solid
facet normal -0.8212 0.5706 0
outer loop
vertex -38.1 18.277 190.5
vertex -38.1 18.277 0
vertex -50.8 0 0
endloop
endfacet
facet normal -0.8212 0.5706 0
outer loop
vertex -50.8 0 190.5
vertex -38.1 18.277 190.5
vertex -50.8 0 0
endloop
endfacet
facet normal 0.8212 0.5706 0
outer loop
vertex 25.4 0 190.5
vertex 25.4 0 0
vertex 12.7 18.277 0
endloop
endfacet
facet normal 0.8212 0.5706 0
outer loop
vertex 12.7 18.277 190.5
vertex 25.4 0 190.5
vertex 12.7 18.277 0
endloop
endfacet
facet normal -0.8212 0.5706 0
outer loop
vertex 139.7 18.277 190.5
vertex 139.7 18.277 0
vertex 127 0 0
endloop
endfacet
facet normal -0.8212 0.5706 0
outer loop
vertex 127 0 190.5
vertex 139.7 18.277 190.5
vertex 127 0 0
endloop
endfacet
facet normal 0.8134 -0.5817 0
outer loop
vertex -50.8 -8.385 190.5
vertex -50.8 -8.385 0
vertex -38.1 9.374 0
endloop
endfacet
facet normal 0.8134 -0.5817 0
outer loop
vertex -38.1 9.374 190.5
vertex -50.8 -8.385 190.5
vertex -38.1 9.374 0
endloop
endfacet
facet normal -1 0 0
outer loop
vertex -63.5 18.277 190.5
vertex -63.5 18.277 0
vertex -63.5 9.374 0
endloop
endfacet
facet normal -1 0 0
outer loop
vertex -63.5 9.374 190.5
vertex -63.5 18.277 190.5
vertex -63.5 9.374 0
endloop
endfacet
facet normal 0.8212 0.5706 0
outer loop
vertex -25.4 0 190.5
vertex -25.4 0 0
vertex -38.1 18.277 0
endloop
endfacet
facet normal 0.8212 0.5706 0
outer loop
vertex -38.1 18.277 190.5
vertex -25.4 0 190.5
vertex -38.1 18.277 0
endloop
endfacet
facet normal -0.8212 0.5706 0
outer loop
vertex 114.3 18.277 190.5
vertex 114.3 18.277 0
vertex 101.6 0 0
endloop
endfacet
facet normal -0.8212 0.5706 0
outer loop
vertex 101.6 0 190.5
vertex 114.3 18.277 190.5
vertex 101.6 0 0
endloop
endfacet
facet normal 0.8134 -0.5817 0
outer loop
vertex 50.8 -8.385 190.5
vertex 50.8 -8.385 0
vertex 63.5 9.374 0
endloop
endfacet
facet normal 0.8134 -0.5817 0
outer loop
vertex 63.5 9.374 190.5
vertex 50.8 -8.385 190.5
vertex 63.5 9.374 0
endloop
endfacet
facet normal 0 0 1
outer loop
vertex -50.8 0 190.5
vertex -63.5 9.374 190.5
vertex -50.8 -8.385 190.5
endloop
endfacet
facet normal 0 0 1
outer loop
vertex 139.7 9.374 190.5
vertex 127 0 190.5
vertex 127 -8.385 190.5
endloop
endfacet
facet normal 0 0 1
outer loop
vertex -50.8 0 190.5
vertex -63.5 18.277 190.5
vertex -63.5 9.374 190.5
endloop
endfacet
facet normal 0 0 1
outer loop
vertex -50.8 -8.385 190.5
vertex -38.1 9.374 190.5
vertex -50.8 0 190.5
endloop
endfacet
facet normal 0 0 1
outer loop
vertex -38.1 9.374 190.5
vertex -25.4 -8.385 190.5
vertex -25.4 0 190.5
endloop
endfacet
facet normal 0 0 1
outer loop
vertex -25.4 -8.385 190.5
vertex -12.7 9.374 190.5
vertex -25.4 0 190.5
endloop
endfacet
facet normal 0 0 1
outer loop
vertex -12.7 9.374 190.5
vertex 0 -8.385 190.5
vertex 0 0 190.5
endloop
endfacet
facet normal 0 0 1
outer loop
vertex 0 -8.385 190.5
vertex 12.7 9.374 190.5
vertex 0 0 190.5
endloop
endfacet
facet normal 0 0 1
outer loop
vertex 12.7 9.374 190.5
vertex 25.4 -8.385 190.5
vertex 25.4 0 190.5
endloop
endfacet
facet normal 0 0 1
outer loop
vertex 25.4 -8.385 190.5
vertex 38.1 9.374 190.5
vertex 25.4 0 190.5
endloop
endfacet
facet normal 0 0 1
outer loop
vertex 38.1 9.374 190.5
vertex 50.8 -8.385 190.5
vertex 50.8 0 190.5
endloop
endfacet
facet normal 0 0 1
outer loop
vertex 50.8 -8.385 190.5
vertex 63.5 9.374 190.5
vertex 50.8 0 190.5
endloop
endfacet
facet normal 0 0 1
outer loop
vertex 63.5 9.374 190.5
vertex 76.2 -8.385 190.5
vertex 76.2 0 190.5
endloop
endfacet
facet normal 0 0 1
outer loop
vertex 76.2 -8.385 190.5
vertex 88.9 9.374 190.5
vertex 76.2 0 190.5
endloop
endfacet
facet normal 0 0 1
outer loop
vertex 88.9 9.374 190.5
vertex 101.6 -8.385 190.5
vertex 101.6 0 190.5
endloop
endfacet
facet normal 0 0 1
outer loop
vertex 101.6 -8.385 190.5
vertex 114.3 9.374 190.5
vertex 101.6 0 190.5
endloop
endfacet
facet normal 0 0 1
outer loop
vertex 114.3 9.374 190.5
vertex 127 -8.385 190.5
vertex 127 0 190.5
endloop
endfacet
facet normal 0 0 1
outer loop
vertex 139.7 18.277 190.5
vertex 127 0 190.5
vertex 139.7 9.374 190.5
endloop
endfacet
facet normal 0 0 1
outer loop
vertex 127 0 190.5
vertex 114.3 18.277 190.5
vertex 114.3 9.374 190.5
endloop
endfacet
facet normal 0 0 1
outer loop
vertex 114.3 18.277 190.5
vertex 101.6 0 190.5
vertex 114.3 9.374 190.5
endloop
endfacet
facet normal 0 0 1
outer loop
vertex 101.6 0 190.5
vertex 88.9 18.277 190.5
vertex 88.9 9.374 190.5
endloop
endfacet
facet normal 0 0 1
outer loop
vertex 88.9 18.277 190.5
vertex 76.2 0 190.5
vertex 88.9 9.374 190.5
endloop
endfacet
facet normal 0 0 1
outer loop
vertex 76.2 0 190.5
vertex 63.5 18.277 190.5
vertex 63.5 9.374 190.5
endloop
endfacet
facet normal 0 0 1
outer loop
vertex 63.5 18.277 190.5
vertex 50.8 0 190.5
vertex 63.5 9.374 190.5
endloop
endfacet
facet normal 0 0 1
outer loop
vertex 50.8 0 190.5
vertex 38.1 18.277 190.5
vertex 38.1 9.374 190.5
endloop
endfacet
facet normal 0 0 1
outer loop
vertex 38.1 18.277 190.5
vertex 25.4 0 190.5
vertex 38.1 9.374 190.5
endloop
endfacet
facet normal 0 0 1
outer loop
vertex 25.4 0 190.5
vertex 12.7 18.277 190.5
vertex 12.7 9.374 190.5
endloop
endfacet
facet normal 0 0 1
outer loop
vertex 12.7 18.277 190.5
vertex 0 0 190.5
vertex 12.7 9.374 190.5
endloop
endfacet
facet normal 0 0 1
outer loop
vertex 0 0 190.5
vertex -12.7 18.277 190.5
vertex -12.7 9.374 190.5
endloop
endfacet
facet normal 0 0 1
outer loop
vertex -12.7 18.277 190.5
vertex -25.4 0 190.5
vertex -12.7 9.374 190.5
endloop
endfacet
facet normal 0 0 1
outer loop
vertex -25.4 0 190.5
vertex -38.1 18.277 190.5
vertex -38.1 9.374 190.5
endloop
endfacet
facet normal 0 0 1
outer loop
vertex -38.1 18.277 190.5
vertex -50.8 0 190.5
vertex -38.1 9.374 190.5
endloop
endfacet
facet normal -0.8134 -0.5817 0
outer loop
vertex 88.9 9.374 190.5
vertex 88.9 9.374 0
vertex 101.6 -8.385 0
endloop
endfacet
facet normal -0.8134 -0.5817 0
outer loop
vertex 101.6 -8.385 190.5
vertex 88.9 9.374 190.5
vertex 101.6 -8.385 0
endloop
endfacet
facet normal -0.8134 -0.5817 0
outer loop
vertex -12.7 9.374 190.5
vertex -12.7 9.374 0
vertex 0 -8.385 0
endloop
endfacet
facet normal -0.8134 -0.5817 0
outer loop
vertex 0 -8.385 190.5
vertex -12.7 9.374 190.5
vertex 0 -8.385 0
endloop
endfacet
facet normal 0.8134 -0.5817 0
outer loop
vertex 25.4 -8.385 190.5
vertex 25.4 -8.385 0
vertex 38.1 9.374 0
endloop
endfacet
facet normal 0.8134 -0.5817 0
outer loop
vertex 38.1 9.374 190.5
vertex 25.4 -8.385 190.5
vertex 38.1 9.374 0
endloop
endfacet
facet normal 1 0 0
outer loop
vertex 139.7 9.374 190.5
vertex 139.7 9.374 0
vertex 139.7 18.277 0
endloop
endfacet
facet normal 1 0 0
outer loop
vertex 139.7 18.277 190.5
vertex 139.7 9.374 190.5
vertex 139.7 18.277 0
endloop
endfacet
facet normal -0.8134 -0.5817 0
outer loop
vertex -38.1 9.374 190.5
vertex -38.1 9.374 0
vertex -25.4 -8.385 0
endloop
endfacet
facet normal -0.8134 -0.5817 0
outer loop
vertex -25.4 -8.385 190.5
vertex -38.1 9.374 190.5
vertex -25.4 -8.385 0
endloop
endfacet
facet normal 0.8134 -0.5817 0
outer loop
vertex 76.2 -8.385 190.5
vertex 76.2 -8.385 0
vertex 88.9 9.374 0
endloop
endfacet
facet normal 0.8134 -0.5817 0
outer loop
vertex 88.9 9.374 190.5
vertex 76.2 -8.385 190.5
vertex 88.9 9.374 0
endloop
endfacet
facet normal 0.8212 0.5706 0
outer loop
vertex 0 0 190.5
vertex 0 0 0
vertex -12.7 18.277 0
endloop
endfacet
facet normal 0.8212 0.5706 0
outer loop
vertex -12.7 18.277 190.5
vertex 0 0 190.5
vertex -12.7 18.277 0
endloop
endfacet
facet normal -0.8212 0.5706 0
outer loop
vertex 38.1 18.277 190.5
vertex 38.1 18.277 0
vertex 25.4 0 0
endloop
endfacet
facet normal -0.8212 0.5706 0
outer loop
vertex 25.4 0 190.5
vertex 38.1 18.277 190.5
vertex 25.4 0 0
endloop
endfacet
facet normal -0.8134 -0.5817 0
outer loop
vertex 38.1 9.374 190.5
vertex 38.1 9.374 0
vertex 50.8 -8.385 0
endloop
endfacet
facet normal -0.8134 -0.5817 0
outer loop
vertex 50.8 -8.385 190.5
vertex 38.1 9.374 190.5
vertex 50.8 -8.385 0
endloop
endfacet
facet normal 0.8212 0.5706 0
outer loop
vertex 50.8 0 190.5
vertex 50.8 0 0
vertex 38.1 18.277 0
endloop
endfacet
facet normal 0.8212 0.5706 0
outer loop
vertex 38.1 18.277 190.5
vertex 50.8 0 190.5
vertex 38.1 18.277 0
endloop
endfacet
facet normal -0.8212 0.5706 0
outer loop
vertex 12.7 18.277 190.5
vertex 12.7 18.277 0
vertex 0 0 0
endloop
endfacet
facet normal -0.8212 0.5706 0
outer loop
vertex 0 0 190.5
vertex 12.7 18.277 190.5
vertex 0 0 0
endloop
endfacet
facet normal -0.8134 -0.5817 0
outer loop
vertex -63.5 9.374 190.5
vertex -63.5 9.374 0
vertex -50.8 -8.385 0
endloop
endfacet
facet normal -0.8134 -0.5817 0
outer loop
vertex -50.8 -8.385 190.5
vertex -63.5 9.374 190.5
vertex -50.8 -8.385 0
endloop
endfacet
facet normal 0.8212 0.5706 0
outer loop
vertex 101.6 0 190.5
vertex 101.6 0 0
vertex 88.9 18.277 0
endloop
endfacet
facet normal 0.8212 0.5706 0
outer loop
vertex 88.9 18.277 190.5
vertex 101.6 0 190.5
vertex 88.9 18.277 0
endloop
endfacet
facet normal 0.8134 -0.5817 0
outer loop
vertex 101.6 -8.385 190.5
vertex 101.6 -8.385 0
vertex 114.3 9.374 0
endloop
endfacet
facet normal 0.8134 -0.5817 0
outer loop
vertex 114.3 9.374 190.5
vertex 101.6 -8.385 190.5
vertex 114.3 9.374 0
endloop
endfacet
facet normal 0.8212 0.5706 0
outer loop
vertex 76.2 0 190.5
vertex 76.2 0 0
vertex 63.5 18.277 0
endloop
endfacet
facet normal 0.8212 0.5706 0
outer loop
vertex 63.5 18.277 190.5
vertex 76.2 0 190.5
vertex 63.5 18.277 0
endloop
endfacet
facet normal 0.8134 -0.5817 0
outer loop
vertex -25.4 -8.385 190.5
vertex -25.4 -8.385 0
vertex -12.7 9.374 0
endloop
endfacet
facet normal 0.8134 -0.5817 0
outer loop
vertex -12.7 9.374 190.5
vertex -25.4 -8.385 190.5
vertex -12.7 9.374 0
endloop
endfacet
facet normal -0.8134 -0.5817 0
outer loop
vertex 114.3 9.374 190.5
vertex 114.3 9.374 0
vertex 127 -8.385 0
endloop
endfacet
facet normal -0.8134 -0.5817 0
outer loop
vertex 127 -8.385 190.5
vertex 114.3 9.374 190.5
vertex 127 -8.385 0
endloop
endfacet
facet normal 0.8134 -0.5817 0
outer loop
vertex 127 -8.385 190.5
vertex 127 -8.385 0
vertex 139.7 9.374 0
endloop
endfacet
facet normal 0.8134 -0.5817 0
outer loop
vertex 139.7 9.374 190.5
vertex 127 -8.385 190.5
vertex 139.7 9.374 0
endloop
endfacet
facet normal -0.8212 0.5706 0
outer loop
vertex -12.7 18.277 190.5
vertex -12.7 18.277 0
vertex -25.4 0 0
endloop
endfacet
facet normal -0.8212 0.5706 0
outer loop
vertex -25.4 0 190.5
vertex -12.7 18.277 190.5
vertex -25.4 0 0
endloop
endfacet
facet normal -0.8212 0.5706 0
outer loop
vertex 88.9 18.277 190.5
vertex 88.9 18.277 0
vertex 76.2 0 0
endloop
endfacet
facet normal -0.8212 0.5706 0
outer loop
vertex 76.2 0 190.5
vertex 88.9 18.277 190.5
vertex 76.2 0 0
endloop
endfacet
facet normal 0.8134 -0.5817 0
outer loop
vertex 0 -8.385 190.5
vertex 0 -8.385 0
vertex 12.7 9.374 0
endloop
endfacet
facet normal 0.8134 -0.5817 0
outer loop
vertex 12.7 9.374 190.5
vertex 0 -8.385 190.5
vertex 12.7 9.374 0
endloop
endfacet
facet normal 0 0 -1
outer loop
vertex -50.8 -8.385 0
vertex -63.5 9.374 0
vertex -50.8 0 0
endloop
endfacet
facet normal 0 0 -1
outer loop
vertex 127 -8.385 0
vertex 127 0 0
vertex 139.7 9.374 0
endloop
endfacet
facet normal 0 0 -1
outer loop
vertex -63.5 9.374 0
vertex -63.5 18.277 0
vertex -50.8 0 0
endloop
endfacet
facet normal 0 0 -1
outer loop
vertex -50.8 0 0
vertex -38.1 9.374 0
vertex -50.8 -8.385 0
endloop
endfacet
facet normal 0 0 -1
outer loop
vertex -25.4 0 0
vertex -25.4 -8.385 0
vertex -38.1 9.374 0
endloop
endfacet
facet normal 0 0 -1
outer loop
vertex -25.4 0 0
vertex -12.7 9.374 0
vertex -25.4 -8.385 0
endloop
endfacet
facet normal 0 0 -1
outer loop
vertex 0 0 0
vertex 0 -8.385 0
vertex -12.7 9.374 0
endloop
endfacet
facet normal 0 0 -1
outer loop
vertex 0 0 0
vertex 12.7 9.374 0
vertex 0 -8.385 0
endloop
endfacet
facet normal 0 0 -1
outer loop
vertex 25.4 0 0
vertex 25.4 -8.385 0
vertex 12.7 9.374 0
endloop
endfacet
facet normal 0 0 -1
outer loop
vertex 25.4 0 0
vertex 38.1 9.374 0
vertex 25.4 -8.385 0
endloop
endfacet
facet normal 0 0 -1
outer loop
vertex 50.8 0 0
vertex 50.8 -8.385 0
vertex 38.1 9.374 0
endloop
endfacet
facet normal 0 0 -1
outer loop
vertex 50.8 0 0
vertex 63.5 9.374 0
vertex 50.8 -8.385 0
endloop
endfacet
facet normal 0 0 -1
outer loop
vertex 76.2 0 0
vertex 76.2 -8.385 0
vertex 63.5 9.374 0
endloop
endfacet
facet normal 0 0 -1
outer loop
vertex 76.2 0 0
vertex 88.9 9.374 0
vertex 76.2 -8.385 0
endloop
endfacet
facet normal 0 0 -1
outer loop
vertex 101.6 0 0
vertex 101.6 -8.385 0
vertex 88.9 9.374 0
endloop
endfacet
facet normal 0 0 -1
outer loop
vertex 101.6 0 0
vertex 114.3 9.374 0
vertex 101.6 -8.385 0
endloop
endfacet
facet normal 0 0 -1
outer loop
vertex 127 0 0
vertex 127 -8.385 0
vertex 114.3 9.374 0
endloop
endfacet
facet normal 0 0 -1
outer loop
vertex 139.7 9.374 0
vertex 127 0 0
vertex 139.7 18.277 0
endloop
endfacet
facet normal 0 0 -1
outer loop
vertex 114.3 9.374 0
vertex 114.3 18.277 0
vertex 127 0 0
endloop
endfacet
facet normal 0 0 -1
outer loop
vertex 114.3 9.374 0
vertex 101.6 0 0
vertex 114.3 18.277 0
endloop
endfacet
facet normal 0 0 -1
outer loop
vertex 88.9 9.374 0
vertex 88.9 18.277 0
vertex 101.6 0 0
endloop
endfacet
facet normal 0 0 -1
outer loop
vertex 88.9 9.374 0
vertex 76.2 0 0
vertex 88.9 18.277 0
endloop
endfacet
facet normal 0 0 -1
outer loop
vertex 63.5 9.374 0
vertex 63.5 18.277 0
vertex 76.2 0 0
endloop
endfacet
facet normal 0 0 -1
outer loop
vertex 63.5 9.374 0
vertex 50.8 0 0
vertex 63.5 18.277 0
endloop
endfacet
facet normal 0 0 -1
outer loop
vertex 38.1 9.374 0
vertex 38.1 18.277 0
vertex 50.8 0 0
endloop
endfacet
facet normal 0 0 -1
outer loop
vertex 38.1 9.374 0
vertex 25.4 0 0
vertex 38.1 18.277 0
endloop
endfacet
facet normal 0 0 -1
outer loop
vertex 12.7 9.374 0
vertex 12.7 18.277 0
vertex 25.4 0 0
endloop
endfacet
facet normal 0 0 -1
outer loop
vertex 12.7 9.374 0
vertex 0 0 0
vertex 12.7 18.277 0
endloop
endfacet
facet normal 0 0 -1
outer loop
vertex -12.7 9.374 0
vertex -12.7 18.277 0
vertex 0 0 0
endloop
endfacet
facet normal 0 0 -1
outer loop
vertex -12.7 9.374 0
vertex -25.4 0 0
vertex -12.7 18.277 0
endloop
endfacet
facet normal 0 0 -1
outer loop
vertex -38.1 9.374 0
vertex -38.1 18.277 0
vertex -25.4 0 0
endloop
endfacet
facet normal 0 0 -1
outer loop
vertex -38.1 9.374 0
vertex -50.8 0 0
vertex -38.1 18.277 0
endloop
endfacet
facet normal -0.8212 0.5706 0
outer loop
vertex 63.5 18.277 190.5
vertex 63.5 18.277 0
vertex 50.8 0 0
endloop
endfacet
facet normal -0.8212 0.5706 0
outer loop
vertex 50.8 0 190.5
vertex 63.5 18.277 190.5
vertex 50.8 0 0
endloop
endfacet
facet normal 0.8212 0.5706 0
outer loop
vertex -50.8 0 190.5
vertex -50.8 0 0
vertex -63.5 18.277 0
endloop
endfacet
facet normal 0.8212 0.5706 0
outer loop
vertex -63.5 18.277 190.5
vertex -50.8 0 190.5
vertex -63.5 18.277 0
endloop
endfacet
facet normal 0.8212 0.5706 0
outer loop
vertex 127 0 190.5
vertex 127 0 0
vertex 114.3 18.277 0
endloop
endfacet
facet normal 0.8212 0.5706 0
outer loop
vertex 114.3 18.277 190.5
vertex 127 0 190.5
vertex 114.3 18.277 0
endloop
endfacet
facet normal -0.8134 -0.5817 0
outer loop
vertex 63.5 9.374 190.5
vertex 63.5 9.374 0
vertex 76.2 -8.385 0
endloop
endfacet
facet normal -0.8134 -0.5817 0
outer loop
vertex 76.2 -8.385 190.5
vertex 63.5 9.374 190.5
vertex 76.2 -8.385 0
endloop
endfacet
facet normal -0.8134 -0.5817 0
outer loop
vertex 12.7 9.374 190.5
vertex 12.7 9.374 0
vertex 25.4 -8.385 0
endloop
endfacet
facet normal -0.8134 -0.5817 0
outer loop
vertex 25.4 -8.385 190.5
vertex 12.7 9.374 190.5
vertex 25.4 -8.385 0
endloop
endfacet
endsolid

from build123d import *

# Parameters (mm, degrees)
F1_DEPTH = 190.5


with BuildPart() as f1:
    # F0 (on Top) → F1 (new body)
    with BuildSketch(Plane.XY):
        Polygon((-50.8, 0), (-63.5, 18.276649), (-63.5, 9.374281), (-50.8, -8.384577), (-38.1, 9.374281), (-25.4, -8.384577), (-12.7, 9.374281), (0, -8.384577), (12.7, 9.374281), (25.4, -8.384577), (38.1, 9.374281), (50.8, -8.384577), (63.5, 9.374281), (76.2, -8.384577), (88.9, 9.374281), (101.6, -8.384577), (114.3, 9.374281), (127, -8.384577), (139.7, 9.374281), (139.7, 18.276649), (127, 0), (114.3, 18.276649), (101.6, 0), (88.9, 18.276649), (76.2, 0), (63.5, 18.276649), (50.8, 0), (38.1, 18.276649), (25.4, 0), (12.7, 18.276649), (0, 0), (-12.7, 18.276649), (-25.4, 0), (-38.1, 18.276649), align=None)
    extrude(amount=F1_DEPTH)


solid = f1.part
